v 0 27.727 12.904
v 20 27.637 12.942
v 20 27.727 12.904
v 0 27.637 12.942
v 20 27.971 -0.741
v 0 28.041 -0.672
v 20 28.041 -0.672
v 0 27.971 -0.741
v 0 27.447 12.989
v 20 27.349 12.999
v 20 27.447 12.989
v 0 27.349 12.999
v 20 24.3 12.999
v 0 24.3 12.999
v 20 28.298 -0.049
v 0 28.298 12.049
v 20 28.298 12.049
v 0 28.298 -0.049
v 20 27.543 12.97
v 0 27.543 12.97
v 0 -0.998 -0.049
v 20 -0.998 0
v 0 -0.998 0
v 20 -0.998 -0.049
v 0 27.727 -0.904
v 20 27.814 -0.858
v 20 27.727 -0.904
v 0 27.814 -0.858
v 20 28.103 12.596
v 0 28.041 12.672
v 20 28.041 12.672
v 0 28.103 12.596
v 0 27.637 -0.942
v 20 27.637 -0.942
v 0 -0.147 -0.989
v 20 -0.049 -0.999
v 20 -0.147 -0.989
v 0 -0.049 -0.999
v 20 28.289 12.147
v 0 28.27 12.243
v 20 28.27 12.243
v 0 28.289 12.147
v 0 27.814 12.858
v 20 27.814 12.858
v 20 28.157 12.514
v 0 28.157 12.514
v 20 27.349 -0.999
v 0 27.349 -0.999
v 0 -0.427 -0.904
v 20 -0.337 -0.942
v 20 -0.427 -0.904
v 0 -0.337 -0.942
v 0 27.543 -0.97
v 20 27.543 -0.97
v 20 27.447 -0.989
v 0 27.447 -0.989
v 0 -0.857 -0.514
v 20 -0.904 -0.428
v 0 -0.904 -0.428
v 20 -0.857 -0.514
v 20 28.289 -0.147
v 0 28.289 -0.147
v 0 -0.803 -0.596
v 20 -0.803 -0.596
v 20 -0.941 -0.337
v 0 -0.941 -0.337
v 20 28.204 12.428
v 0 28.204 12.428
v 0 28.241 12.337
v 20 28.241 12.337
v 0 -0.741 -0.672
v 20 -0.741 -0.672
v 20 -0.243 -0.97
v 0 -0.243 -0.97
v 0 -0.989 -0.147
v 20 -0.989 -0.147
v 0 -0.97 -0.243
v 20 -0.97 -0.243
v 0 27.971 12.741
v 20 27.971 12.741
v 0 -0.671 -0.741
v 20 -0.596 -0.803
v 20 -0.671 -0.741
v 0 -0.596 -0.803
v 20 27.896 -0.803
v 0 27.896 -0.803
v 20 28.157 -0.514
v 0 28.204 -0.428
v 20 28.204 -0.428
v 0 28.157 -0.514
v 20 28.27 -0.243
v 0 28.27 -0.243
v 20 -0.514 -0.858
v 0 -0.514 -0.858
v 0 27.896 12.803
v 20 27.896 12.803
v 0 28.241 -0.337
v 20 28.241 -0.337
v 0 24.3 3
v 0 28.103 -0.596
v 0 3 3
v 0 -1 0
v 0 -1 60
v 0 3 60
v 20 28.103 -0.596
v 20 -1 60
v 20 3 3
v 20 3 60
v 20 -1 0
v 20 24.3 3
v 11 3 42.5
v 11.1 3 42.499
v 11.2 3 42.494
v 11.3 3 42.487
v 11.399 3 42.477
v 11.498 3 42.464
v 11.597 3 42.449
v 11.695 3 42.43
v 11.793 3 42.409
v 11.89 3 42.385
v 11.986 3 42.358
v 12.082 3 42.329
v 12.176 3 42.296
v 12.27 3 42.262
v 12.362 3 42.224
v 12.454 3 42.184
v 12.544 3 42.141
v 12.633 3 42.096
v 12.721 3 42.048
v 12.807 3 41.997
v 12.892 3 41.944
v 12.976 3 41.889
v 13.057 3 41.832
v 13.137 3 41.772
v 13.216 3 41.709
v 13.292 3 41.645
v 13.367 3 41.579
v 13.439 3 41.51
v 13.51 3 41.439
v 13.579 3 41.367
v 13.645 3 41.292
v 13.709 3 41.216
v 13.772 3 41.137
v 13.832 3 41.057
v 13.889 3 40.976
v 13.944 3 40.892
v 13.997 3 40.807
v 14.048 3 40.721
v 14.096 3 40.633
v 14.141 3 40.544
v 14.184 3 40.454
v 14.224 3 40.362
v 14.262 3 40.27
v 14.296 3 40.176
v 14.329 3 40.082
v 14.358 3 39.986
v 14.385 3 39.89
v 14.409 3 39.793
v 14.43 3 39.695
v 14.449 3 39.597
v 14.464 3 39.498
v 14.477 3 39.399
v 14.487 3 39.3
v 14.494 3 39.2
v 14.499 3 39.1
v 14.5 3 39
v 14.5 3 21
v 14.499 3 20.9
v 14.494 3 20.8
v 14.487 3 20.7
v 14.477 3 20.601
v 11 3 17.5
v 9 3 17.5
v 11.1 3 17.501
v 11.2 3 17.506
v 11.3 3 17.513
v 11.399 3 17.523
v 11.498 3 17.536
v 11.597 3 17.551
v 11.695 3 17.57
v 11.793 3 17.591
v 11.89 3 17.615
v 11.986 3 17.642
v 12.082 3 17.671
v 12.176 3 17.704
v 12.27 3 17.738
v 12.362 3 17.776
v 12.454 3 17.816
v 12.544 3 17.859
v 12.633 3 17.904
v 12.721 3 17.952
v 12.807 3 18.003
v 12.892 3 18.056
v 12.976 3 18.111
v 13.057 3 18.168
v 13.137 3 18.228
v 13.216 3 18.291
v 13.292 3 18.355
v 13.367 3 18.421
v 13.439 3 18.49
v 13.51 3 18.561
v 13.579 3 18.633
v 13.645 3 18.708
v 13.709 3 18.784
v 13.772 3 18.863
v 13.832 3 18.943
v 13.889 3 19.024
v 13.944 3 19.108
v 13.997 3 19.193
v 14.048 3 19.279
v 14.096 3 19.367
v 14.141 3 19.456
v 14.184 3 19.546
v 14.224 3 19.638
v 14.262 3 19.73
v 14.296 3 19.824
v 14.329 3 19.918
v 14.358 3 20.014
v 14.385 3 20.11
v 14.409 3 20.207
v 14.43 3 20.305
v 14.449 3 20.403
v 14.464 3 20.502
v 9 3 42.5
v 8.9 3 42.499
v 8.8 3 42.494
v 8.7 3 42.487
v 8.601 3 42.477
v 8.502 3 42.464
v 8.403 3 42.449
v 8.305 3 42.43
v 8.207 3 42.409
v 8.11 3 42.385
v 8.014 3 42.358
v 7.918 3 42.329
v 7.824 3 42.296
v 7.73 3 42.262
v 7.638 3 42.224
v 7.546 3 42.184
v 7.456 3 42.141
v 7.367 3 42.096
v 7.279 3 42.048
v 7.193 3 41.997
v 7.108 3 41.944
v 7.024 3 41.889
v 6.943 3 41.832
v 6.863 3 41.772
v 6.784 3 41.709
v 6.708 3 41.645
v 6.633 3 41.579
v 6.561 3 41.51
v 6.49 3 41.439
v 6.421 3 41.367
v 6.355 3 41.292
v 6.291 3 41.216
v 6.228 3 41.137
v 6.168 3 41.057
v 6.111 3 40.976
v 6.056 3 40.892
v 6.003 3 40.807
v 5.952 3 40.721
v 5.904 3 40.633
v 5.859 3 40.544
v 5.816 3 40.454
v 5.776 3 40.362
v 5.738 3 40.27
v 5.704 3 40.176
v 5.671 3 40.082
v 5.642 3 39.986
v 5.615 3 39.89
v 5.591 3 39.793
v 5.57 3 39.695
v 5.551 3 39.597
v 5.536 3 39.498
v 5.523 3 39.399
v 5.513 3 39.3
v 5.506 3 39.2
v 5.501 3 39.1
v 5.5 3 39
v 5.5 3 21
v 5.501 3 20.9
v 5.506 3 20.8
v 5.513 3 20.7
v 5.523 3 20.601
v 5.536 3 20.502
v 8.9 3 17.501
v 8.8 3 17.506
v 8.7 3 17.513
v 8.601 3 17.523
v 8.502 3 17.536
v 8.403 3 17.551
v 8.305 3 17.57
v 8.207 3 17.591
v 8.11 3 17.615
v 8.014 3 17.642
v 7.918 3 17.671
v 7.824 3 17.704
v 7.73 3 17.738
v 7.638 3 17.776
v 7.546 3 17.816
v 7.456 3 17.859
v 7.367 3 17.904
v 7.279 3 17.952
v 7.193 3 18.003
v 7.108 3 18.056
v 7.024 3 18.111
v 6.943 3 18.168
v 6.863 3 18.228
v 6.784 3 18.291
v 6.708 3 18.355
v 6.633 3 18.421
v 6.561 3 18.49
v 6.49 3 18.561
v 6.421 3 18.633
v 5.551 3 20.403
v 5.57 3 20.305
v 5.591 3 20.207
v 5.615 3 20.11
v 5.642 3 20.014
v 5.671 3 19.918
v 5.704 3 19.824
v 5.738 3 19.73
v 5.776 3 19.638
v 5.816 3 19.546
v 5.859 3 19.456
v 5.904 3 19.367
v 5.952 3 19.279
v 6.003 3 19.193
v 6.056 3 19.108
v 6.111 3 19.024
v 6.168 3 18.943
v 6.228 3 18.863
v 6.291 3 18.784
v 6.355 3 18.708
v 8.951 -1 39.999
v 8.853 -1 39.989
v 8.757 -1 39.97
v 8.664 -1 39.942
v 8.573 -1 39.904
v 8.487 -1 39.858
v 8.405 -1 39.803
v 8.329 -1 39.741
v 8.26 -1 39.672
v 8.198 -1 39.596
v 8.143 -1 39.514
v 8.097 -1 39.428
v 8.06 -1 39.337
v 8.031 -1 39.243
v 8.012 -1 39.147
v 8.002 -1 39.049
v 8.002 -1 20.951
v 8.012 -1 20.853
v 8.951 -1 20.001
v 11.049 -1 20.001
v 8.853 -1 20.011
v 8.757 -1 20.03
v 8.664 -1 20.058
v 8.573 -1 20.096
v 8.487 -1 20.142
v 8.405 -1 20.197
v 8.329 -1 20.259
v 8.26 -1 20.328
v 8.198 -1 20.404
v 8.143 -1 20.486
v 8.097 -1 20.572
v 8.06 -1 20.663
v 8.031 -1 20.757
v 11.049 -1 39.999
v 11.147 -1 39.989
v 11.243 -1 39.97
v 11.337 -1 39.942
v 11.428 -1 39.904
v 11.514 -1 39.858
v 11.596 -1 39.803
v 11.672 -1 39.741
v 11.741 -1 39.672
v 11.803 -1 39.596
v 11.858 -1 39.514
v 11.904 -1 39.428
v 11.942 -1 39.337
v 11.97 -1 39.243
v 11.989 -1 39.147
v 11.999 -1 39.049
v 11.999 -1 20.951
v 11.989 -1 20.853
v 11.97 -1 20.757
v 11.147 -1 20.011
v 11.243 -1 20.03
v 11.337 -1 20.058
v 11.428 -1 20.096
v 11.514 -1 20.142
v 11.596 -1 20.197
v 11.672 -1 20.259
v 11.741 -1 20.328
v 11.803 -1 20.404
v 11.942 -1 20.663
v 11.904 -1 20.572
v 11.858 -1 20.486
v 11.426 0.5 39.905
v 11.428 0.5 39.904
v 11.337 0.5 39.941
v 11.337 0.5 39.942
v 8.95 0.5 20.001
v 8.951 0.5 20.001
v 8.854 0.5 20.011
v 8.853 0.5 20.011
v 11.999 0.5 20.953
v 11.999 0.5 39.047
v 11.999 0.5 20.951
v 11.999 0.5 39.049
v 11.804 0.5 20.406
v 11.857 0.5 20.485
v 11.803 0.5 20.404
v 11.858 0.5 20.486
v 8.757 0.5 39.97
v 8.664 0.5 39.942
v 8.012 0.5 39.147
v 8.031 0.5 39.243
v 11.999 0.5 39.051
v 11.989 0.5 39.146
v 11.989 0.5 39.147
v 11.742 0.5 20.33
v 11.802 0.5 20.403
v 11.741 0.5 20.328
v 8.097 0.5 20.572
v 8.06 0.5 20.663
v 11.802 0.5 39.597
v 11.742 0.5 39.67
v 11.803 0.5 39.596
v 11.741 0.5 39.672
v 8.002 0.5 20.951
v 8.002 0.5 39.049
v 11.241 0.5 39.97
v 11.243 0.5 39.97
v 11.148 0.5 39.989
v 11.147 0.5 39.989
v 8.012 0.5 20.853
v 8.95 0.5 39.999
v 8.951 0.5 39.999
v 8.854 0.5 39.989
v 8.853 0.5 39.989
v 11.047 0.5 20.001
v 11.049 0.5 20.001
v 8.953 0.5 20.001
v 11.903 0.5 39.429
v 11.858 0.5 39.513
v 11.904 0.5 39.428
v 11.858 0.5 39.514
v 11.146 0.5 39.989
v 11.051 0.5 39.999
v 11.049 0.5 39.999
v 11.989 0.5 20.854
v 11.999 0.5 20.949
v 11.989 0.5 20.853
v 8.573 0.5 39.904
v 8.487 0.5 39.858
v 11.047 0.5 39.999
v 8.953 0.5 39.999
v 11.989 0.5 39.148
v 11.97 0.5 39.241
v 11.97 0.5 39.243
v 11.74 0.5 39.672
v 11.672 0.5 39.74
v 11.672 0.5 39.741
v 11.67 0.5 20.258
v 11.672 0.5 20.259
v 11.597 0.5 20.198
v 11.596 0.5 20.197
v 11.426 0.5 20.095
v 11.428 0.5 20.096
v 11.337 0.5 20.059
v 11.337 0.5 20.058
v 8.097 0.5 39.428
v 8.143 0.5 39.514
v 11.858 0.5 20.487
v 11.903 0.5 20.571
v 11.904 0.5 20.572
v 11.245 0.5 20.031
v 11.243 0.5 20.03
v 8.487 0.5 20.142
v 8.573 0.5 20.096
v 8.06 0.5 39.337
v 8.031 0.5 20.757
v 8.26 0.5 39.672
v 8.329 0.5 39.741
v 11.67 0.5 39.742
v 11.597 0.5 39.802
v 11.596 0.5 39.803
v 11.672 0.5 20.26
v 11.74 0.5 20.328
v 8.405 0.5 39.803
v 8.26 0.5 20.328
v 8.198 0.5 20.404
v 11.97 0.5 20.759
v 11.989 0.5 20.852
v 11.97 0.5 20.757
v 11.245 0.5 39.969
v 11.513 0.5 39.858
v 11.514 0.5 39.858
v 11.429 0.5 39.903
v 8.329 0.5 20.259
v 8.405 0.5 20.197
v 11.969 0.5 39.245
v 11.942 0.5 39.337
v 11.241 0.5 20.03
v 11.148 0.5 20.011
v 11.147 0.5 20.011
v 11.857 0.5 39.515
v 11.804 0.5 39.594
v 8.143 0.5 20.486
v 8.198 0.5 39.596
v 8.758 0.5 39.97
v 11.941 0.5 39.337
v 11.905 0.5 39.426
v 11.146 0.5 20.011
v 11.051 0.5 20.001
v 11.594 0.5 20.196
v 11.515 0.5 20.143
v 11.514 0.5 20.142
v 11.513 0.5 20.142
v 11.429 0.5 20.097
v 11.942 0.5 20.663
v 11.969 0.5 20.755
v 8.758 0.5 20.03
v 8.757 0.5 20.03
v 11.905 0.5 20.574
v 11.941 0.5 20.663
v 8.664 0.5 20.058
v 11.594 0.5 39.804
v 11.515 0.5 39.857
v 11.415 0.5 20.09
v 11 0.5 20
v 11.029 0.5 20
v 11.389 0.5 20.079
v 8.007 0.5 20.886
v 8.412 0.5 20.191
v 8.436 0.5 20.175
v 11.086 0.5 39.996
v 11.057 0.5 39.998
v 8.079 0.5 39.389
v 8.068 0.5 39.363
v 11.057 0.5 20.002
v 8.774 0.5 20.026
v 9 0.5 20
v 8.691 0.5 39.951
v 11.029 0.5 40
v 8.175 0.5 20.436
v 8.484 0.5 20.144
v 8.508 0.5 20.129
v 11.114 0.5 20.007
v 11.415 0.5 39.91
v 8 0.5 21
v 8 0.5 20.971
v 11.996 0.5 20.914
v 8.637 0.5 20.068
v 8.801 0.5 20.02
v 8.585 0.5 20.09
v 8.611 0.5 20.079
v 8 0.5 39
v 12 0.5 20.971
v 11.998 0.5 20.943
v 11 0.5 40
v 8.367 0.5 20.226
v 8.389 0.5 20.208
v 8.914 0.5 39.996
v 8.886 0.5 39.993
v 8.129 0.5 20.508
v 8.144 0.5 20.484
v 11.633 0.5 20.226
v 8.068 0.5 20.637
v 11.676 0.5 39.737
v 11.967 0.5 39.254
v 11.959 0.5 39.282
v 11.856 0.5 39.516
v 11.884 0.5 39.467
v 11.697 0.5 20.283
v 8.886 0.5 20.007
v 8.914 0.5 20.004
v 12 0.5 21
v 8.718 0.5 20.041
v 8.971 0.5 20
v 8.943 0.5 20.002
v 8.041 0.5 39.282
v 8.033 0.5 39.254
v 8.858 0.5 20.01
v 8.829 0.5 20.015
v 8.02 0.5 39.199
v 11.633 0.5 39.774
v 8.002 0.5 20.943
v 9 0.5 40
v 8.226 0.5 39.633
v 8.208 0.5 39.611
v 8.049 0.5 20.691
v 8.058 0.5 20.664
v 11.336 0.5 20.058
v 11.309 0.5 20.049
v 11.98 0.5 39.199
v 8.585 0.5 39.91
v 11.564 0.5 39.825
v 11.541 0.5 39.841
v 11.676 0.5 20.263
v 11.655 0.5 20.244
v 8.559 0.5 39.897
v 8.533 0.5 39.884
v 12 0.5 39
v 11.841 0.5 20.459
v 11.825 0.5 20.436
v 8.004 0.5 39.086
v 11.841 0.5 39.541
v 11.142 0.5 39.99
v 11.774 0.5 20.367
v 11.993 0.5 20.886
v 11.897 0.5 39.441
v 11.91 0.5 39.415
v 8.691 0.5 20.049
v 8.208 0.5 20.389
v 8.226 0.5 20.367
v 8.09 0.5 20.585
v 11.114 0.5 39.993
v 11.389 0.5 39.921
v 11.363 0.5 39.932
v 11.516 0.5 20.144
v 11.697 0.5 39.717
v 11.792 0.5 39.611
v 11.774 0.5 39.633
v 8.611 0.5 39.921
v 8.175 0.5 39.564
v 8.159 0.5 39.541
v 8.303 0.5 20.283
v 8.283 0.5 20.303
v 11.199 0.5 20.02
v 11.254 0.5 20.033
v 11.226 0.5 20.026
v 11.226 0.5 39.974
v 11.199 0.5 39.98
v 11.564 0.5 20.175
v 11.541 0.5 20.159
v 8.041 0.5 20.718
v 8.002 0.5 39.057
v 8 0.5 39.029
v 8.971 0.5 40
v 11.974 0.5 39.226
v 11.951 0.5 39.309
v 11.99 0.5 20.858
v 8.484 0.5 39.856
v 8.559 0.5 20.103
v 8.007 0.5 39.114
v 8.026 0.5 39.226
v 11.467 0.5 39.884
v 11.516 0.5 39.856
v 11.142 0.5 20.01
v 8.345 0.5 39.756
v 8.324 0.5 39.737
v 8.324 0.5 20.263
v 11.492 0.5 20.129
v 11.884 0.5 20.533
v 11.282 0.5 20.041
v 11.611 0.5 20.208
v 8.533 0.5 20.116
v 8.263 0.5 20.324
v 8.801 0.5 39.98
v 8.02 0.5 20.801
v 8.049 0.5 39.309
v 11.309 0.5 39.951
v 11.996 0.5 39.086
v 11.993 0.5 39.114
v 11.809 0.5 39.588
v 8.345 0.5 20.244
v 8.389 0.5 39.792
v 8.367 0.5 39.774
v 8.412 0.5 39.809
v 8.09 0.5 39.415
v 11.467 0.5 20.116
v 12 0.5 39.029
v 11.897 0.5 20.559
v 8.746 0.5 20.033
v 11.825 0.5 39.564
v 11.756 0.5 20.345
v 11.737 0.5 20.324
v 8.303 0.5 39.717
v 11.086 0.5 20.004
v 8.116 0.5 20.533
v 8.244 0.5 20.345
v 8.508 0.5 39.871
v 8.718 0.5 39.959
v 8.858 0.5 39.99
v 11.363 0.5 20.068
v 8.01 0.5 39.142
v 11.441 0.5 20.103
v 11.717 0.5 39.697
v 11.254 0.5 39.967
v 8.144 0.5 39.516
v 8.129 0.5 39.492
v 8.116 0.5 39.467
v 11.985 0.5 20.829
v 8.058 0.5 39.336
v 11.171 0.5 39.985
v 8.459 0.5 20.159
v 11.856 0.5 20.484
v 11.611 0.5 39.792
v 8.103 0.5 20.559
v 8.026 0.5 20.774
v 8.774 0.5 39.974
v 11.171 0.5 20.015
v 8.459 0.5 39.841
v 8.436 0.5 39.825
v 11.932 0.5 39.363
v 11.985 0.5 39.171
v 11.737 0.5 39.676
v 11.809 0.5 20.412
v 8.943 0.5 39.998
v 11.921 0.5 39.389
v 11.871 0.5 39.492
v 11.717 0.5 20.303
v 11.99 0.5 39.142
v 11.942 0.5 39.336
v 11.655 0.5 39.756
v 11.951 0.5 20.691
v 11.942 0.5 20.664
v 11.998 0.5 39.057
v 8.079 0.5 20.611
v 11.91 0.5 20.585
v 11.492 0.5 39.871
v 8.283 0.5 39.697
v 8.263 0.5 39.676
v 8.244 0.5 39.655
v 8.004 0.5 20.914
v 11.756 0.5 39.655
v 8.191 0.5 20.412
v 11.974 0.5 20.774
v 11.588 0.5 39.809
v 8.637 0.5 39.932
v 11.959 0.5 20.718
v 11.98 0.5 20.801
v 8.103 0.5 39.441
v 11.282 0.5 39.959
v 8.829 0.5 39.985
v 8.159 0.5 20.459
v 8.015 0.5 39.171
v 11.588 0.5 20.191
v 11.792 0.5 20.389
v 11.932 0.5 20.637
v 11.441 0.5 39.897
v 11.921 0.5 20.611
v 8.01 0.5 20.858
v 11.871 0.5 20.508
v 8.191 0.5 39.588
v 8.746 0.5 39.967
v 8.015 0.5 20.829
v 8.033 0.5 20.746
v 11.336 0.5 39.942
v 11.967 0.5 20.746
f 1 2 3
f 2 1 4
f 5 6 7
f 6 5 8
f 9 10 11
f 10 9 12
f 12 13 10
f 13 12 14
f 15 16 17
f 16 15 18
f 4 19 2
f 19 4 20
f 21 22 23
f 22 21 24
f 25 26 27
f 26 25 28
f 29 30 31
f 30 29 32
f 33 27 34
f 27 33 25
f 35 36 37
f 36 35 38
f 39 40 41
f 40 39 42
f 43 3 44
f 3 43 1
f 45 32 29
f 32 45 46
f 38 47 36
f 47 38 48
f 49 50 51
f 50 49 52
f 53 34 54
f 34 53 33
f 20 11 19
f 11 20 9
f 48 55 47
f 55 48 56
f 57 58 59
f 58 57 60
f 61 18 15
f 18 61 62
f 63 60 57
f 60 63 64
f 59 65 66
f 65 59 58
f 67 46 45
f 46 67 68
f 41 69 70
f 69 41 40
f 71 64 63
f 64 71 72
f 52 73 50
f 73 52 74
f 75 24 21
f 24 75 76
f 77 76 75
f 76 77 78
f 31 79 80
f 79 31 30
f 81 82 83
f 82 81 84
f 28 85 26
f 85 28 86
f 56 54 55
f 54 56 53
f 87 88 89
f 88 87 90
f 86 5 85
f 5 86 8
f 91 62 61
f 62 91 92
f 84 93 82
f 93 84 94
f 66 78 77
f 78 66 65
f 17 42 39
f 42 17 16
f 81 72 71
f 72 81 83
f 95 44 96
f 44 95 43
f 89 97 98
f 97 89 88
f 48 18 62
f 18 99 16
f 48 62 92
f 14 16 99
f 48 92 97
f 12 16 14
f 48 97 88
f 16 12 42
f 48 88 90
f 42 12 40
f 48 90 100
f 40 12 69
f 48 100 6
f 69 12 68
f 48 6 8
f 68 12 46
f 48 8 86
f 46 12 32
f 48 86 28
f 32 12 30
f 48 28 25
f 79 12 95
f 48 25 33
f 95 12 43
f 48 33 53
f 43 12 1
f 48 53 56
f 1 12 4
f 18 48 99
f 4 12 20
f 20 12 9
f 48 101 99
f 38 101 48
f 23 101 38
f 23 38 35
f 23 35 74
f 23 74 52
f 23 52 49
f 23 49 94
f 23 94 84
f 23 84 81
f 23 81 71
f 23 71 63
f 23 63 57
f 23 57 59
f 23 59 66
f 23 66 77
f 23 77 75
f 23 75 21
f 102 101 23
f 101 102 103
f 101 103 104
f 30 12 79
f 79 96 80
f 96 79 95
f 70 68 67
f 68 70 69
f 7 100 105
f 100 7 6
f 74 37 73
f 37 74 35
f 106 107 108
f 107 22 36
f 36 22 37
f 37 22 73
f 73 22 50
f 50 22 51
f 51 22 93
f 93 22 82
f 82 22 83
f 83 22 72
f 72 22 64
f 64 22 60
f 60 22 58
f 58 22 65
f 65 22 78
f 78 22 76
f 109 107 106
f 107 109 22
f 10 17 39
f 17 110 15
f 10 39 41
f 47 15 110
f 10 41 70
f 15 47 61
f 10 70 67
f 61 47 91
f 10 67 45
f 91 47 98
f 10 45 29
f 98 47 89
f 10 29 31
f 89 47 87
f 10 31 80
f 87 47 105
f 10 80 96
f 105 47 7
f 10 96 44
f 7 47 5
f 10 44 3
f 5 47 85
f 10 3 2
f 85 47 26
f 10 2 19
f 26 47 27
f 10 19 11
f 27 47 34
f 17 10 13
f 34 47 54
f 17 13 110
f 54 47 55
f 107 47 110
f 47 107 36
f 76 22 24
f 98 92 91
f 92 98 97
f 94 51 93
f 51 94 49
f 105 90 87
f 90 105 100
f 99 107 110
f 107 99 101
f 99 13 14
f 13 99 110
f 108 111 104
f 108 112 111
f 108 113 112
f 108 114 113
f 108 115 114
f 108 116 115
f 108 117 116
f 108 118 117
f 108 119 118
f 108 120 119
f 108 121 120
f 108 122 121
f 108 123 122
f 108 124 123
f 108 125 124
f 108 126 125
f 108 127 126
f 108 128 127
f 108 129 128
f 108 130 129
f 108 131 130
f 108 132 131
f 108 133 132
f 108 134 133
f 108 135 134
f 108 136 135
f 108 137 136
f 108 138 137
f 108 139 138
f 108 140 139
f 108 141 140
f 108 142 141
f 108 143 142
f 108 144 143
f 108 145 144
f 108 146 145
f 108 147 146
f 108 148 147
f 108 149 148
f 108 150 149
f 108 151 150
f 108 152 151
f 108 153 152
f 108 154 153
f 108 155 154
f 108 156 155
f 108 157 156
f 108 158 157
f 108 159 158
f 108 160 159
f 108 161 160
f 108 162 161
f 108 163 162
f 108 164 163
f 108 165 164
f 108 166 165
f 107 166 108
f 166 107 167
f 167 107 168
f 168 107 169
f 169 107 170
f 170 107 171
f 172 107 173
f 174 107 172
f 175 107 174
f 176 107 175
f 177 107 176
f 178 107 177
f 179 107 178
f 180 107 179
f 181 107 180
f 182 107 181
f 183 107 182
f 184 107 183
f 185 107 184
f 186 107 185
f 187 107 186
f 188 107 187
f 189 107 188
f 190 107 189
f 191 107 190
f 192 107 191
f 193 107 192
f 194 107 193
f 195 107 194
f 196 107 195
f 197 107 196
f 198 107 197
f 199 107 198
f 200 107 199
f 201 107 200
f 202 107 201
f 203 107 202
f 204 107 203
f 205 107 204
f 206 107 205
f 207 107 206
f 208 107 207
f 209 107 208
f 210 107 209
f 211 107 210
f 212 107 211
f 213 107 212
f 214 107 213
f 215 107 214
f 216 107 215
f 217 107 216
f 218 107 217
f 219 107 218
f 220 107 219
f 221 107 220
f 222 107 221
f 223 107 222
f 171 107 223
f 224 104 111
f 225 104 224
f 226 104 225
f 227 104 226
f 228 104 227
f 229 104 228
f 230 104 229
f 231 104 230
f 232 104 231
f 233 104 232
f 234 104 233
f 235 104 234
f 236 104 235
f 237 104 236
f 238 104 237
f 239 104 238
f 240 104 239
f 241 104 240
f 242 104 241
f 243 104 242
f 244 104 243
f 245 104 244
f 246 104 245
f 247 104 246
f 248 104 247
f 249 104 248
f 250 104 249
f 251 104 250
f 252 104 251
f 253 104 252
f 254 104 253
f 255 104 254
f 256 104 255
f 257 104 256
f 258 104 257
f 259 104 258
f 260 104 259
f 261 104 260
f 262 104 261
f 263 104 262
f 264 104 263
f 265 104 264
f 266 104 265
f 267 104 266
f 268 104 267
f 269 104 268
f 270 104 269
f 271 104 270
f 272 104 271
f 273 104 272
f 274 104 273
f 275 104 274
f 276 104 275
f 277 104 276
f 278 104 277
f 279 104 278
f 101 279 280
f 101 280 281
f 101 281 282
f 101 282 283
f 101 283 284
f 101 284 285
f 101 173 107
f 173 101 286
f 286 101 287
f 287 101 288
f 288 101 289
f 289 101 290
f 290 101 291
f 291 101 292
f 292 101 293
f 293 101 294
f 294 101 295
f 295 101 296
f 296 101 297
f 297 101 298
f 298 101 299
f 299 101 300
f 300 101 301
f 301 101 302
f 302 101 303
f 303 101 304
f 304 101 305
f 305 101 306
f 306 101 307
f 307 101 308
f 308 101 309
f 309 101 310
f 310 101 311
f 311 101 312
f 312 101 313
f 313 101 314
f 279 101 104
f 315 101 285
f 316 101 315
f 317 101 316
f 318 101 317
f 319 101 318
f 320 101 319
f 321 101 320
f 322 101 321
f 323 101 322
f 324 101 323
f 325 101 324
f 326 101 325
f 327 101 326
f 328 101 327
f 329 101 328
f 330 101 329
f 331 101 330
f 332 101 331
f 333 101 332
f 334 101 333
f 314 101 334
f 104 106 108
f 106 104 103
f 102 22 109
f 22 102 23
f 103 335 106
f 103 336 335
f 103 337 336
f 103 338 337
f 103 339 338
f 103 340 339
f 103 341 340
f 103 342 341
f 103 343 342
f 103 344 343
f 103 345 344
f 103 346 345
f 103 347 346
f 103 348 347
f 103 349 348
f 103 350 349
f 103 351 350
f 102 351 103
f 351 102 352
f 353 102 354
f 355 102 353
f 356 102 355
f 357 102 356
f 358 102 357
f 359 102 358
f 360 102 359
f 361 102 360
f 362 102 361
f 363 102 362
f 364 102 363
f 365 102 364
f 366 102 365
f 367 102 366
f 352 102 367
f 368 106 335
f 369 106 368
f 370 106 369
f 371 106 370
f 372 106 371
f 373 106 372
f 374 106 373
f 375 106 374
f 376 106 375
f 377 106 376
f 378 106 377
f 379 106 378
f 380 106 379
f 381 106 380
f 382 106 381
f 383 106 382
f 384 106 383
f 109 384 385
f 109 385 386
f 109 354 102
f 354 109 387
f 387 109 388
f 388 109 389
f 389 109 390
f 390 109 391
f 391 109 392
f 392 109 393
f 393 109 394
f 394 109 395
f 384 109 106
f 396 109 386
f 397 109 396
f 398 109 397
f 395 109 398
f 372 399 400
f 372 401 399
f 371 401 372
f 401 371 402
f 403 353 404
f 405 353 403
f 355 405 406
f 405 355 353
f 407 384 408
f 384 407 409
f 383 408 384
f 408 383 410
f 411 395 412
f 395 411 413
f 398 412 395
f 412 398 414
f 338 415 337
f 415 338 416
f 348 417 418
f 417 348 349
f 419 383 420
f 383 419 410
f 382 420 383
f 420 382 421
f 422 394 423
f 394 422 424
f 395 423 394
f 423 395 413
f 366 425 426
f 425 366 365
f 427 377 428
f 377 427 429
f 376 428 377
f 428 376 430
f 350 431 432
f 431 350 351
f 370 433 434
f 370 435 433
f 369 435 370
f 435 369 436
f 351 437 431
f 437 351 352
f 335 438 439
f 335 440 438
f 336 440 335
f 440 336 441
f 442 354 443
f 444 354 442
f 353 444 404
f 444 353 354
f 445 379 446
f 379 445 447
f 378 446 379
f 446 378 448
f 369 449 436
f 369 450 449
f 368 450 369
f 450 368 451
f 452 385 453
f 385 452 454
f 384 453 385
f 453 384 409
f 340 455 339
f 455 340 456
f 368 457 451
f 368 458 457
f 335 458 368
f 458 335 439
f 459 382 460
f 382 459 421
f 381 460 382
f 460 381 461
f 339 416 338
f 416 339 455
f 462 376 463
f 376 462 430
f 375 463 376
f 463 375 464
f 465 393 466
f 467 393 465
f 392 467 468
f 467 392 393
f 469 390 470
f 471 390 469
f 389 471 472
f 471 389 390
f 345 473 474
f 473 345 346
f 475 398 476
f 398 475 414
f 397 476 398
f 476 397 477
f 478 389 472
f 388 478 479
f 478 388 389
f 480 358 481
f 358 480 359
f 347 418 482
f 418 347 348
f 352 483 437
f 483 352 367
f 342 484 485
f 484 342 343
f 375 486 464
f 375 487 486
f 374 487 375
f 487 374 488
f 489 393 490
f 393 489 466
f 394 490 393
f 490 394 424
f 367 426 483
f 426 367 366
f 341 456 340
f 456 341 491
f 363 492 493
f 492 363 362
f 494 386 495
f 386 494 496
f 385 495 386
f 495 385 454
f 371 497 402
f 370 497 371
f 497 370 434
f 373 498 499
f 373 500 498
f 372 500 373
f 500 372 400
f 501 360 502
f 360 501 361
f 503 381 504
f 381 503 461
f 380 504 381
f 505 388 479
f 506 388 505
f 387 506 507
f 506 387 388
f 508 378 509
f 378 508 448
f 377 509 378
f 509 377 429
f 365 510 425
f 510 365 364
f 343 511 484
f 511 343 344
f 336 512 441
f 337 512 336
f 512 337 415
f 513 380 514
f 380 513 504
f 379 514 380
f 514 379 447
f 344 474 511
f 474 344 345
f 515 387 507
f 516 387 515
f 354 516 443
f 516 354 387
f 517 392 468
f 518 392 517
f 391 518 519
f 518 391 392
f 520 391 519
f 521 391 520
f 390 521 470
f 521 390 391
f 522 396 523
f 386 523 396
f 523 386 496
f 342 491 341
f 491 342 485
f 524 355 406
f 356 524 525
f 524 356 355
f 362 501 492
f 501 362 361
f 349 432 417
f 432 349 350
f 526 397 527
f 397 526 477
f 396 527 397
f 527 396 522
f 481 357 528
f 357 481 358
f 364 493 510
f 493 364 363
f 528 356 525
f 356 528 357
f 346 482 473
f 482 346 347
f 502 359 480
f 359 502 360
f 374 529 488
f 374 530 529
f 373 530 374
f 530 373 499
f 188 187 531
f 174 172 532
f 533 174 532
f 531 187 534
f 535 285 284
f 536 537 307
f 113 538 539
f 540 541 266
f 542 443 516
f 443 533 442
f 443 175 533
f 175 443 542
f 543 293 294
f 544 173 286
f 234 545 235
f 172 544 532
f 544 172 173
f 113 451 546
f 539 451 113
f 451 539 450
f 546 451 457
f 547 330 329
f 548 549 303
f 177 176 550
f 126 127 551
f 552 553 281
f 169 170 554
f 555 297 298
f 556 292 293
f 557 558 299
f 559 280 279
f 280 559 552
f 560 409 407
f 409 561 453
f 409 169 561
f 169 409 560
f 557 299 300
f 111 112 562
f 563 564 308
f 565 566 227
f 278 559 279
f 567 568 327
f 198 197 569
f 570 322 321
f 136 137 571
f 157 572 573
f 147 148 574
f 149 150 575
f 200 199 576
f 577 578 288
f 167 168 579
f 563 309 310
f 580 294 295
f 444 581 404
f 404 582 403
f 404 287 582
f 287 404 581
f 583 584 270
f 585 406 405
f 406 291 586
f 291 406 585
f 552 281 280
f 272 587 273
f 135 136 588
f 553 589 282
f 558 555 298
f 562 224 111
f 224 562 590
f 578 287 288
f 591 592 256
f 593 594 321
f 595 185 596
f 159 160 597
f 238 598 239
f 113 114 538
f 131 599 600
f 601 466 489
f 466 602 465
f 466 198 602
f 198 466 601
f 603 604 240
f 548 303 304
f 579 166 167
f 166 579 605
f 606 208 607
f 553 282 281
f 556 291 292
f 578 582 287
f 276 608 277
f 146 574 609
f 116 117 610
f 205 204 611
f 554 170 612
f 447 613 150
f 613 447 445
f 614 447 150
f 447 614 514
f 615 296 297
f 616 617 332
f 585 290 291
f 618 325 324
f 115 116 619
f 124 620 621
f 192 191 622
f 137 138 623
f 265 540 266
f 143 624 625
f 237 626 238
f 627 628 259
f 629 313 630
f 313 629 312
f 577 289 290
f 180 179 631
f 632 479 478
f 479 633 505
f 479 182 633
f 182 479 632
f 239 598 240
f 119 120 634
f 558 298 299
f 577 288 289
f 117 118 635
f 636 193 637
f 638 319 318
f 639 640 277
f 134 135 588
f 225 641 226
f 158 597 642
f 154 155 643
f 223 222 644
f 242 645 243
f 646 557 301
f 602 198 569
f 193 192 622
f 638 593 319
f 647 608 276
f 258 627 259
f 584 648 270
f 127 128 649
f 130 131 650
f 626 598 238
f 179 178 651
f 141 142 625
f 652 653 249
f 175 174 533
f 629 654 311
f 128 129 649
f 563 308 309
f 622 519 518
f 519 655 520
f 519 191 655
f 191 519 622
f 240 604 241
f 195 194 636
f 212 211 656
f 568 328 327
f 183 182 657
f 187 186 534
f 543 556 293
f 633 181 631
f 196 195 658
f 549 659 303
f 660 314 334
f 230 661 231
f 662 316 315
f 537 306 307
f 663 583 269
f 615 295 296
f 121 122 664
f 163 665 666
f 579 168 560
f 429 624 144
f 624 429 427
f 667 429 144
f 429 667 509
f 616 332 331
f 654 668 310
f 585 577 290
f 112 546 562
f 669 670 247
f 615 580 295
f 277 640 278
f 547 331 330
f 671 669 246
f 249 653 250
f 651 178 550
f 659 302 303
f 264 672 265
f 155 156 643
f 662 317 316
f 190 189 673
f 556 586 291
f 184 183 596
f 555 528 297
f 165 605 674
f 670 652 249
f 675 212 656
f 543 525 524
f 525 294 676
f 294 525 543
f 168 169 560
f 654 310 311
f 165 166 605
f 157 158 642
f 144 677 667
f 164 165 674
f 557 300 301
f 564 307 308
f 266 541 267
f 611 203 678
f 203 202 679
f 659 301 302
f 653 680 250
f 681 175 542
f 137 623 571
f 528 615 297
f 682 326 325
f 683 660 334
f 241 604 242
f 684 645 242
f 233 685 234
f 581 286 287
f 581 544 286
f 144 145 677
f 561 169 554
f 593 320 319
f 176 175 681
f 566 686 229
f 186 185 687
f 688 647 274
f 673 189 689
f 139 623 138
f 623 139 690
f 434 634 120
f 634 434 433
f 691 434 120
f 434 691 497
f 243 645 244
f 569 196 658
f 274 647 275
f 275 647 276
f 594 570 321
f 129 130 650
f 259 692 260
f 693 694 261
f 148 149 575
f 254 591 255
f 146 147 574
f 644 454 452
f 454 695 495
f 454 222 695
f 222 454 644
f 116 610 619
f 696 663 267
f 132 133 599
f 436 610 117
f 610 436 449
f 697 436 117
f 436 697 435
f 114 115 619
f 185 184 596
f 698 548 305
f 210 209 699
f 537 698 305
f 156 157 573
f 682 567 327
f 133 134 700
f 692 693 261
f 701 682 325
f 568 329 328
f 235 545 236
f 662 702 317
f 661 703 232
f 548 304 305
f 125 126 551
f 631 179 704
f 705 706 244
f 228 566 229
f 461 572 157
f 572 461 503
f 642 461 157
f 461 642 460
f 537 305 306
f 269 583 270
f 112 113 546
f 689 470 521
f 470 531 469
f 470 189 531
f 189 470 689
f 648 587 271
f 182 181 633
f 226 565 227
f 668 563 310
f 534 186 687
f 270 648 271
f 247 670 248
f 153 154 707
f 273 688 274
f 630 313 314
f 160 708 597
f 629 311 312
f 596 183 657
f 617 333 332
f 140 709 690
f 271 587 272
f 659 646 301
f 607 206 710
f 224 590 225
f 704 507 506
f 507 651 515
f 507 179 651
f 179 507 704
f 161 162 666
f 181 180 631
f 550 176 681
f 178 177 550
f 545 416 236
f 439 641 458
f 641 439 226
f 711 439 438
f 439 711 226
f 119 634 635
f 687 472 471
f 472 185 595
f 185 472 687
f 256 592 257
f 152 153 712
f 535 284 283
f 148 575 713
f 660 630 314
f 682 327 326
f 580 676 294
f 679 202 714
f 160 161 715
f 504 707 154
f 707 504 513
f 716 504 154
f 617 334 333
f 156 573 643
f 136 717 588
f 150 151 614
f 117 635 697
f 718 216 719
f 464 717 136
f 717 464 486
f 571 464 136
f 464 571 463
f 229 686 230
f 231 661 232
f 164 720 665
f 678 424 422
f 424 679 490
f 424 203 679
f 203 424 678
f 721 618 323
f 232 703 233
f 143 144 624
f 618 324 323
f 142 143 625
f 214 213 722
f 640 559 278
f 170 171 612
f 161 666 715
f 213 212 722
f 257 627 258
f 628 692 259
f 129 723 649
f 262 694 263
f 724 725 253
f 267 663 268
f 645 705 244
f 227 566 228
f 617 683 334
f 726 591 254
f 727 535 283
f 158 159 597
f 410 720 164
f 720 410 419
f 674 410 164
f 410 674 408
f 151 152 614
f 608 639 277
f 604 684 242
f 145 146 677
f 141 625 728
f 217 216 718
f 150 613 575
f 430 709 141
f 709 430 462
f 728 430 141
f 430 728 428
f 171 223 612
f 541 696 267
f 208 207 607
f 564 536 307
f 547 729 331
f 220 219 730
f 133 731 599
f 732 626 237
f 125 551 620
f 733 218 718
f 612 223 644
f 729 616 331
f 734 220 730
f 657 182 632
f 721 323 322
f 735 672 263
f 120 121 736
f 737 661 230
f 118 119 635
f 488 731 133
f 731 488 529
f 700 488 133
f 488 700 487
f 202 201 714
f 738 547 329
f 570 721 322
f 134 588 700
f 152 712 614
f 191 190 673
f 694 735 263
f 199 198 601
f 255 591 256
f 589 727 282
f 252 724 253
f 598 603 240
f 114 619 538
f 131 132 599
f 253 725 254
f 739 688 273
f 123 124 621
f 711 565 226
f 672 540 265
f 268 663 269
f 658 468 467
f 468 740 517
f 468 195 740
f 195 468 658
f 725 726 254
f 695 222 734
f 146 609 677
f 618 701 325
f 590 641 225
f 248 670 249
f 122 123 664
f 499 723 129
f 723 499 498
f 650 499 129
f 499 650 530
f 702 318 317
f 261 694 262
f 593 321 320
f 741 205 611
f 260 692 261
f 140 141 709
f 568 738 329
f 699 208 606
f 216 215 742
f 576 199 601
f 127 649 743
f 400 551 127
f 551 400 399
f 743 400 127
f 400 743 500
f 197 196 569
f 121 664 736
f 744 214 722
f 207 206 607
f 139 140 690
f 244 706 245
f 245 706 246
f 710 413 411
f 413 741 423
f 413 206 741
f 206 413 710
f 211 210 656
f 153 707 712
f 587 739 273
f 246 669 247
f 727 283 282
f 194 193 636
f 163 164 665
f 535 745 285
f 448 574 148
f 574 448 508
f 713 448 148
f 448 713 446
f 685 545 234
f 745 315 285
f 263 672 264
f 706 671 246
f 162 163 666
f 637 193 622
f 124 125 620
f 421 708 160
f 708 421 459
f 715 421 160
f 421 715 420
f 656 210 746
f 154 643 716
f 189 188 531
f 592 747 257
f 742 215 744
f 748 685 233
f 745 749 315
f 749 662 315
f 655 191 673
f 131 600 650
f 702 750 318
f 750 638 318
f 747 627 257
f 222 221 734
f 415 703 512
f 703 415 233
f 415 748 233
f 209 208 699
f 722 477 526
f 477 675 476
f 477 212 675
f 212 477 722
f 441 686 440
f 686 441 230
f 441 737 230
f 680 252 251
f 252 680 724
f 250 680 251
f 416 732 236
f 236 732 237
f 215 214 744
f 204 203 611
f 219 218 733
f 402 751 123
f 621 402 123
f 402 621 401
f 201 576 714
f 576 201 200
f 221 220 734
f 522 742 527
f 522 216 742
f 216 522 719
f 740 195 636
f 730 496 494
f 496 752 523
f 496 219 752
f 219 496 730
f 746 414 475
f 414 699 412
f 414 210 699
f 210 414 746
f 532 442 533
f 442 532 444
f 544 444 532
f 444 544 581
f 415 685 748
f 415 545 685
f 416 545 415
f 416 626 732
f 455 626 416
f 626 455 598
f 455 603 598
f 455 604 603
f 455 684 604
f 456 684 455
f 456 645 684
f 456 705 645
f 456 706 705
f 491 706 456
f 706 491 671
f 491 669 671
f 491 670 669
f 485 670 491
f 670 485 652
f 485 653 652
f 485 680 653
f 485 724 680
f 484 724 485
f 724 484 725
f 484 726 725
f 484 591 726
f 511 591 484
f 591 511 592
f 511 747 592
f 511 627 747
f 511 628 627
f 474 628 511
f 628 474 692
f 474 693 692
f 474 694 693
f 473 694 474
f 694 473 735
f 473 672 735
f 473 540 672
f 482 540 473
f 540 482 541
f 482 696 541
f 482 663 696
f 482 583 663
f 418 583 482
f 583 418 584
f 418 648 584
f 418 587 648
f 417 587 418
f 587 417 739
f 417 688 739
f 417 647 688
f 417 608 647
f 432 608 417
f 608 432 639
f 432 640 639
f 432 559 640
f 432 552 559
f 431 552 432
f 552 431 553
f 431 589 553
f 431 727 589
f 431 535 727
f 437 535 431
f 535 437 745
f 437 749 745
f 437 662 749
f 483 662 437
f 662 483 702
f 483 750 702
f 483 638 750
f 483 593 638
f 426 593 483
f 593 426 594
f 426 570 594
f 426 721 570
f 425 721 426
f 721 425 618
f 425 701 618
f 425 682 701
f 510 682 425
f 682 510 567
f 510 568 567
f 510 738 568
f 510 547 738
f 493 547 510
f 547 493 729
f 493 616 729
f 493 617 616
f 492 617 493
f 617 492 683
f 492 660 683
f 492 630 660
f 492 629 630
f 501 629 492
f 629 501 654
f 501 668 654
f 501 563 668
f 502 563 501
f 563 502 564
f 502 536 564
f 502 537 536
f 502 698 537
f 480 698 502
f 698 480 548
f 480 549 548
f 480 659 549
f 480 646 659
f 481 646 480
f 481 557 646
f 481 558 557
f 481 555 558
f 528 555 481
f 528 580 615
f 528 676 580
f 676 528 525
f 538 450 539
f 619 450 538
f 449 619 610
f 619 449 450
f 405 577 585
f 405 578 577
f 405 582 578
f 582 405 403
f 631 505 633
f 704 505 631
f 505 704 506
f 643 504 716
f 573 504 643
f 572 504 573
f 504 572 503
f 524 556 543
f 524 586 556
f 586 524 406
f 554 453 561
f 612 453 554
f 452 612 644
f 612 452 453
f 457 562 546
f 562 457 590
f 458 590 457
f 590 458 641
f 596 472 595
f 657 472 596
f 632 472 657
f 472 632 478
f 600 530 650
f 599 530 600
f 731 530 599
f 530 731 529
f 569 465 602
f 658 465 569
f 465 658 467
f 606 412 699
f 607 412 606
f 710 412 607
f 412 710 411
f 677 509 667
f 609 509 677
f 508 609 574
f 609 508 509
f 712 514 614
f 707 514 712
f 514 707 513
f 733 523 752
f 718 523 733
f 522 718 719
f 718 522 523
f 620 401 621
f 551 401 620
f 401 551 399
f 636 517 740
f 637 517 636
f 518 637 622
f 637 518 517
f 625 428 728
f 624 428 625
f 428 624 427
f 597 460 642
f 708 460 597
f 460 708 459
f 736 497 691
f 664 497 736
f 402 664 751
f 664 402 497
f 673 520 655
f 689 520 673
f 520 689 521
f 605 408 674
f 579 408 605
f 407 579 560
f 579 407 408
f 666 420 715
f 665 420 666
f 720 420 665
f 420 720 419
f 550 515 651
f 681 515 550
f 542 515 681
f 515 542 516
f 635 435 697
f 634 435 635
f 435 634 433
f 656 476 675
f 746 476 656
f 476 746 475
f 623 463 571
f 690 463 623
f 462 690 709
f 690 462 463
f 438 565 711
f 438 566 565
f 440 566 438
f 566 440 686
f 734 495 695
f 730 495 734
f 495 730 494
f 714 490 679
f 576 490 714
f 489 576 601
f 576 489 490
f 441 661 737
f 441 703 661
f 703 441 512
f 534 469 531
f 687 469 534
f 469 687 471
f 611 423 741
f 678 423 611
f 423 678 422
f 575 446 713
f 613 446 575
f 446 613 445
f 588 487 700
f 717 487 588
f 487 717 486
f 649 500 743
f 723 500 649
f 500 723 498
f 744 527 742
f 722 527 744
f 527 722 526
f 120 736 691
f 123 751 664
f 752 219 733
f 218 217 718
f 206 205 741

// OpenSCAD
spacing = 0.1;
board_thickness = 21.1 + spacing * 2;
thickness = 4;
roundness = 1;
width = 20;
height = 60;
hook_height = 10;
hole_length = 20;
hole_width = 4;
sinking = 2.5;

$fs = 0.1;
$fa = 1;

difference() {
	union() {
		difference() {
			minkowski() { //Bottom cup.
				cube([width, board_thickness + thickness * 2 - roundness * 2, hook_height + thickness - roundness * 2]);
				scale([0, 1, 1]) {
					sphere(r=roundness);
				}
			}
			translate([0, thickness - roundness, thickness - roundness]) {
				cube([width, board_thickness, hook_height]); //Hole for board.
			}
		}
		translate([0, -roundness, 0]) {
			cube([width, thickness, height]); //Wall side.
		}
	}
	minkowski() { //Hole for screw.
		translate([(width - hole_width) / 2 + roundness, -roundness, (height - hole_length) / 2 + roundness]) {
			minkowski() {
				cube([hole_width - roundness * 2, thickness, hole_length - roundness * 2]);
				scale([1, 0, 1]) {
					sphere(r=roundness);
				}
			}
		}
	}
	minkowski() { //Sinking of screw.
		translate([(width - hole_width) / 2 + roundness, thickness - roundness, (height - hole_length) / 2 + roundness]) {
			minkowski() {
				scale([1, 0, 1]) {
					cube([hole_width - roundness * 2, thickness, hole_length - roundness * 2]);
				}
				rotate([90, 0, 0]) {
					cylinder(r1=roundness + sinking, r2=roundness, h=sinking);
				}
			}
		}
	}
}
